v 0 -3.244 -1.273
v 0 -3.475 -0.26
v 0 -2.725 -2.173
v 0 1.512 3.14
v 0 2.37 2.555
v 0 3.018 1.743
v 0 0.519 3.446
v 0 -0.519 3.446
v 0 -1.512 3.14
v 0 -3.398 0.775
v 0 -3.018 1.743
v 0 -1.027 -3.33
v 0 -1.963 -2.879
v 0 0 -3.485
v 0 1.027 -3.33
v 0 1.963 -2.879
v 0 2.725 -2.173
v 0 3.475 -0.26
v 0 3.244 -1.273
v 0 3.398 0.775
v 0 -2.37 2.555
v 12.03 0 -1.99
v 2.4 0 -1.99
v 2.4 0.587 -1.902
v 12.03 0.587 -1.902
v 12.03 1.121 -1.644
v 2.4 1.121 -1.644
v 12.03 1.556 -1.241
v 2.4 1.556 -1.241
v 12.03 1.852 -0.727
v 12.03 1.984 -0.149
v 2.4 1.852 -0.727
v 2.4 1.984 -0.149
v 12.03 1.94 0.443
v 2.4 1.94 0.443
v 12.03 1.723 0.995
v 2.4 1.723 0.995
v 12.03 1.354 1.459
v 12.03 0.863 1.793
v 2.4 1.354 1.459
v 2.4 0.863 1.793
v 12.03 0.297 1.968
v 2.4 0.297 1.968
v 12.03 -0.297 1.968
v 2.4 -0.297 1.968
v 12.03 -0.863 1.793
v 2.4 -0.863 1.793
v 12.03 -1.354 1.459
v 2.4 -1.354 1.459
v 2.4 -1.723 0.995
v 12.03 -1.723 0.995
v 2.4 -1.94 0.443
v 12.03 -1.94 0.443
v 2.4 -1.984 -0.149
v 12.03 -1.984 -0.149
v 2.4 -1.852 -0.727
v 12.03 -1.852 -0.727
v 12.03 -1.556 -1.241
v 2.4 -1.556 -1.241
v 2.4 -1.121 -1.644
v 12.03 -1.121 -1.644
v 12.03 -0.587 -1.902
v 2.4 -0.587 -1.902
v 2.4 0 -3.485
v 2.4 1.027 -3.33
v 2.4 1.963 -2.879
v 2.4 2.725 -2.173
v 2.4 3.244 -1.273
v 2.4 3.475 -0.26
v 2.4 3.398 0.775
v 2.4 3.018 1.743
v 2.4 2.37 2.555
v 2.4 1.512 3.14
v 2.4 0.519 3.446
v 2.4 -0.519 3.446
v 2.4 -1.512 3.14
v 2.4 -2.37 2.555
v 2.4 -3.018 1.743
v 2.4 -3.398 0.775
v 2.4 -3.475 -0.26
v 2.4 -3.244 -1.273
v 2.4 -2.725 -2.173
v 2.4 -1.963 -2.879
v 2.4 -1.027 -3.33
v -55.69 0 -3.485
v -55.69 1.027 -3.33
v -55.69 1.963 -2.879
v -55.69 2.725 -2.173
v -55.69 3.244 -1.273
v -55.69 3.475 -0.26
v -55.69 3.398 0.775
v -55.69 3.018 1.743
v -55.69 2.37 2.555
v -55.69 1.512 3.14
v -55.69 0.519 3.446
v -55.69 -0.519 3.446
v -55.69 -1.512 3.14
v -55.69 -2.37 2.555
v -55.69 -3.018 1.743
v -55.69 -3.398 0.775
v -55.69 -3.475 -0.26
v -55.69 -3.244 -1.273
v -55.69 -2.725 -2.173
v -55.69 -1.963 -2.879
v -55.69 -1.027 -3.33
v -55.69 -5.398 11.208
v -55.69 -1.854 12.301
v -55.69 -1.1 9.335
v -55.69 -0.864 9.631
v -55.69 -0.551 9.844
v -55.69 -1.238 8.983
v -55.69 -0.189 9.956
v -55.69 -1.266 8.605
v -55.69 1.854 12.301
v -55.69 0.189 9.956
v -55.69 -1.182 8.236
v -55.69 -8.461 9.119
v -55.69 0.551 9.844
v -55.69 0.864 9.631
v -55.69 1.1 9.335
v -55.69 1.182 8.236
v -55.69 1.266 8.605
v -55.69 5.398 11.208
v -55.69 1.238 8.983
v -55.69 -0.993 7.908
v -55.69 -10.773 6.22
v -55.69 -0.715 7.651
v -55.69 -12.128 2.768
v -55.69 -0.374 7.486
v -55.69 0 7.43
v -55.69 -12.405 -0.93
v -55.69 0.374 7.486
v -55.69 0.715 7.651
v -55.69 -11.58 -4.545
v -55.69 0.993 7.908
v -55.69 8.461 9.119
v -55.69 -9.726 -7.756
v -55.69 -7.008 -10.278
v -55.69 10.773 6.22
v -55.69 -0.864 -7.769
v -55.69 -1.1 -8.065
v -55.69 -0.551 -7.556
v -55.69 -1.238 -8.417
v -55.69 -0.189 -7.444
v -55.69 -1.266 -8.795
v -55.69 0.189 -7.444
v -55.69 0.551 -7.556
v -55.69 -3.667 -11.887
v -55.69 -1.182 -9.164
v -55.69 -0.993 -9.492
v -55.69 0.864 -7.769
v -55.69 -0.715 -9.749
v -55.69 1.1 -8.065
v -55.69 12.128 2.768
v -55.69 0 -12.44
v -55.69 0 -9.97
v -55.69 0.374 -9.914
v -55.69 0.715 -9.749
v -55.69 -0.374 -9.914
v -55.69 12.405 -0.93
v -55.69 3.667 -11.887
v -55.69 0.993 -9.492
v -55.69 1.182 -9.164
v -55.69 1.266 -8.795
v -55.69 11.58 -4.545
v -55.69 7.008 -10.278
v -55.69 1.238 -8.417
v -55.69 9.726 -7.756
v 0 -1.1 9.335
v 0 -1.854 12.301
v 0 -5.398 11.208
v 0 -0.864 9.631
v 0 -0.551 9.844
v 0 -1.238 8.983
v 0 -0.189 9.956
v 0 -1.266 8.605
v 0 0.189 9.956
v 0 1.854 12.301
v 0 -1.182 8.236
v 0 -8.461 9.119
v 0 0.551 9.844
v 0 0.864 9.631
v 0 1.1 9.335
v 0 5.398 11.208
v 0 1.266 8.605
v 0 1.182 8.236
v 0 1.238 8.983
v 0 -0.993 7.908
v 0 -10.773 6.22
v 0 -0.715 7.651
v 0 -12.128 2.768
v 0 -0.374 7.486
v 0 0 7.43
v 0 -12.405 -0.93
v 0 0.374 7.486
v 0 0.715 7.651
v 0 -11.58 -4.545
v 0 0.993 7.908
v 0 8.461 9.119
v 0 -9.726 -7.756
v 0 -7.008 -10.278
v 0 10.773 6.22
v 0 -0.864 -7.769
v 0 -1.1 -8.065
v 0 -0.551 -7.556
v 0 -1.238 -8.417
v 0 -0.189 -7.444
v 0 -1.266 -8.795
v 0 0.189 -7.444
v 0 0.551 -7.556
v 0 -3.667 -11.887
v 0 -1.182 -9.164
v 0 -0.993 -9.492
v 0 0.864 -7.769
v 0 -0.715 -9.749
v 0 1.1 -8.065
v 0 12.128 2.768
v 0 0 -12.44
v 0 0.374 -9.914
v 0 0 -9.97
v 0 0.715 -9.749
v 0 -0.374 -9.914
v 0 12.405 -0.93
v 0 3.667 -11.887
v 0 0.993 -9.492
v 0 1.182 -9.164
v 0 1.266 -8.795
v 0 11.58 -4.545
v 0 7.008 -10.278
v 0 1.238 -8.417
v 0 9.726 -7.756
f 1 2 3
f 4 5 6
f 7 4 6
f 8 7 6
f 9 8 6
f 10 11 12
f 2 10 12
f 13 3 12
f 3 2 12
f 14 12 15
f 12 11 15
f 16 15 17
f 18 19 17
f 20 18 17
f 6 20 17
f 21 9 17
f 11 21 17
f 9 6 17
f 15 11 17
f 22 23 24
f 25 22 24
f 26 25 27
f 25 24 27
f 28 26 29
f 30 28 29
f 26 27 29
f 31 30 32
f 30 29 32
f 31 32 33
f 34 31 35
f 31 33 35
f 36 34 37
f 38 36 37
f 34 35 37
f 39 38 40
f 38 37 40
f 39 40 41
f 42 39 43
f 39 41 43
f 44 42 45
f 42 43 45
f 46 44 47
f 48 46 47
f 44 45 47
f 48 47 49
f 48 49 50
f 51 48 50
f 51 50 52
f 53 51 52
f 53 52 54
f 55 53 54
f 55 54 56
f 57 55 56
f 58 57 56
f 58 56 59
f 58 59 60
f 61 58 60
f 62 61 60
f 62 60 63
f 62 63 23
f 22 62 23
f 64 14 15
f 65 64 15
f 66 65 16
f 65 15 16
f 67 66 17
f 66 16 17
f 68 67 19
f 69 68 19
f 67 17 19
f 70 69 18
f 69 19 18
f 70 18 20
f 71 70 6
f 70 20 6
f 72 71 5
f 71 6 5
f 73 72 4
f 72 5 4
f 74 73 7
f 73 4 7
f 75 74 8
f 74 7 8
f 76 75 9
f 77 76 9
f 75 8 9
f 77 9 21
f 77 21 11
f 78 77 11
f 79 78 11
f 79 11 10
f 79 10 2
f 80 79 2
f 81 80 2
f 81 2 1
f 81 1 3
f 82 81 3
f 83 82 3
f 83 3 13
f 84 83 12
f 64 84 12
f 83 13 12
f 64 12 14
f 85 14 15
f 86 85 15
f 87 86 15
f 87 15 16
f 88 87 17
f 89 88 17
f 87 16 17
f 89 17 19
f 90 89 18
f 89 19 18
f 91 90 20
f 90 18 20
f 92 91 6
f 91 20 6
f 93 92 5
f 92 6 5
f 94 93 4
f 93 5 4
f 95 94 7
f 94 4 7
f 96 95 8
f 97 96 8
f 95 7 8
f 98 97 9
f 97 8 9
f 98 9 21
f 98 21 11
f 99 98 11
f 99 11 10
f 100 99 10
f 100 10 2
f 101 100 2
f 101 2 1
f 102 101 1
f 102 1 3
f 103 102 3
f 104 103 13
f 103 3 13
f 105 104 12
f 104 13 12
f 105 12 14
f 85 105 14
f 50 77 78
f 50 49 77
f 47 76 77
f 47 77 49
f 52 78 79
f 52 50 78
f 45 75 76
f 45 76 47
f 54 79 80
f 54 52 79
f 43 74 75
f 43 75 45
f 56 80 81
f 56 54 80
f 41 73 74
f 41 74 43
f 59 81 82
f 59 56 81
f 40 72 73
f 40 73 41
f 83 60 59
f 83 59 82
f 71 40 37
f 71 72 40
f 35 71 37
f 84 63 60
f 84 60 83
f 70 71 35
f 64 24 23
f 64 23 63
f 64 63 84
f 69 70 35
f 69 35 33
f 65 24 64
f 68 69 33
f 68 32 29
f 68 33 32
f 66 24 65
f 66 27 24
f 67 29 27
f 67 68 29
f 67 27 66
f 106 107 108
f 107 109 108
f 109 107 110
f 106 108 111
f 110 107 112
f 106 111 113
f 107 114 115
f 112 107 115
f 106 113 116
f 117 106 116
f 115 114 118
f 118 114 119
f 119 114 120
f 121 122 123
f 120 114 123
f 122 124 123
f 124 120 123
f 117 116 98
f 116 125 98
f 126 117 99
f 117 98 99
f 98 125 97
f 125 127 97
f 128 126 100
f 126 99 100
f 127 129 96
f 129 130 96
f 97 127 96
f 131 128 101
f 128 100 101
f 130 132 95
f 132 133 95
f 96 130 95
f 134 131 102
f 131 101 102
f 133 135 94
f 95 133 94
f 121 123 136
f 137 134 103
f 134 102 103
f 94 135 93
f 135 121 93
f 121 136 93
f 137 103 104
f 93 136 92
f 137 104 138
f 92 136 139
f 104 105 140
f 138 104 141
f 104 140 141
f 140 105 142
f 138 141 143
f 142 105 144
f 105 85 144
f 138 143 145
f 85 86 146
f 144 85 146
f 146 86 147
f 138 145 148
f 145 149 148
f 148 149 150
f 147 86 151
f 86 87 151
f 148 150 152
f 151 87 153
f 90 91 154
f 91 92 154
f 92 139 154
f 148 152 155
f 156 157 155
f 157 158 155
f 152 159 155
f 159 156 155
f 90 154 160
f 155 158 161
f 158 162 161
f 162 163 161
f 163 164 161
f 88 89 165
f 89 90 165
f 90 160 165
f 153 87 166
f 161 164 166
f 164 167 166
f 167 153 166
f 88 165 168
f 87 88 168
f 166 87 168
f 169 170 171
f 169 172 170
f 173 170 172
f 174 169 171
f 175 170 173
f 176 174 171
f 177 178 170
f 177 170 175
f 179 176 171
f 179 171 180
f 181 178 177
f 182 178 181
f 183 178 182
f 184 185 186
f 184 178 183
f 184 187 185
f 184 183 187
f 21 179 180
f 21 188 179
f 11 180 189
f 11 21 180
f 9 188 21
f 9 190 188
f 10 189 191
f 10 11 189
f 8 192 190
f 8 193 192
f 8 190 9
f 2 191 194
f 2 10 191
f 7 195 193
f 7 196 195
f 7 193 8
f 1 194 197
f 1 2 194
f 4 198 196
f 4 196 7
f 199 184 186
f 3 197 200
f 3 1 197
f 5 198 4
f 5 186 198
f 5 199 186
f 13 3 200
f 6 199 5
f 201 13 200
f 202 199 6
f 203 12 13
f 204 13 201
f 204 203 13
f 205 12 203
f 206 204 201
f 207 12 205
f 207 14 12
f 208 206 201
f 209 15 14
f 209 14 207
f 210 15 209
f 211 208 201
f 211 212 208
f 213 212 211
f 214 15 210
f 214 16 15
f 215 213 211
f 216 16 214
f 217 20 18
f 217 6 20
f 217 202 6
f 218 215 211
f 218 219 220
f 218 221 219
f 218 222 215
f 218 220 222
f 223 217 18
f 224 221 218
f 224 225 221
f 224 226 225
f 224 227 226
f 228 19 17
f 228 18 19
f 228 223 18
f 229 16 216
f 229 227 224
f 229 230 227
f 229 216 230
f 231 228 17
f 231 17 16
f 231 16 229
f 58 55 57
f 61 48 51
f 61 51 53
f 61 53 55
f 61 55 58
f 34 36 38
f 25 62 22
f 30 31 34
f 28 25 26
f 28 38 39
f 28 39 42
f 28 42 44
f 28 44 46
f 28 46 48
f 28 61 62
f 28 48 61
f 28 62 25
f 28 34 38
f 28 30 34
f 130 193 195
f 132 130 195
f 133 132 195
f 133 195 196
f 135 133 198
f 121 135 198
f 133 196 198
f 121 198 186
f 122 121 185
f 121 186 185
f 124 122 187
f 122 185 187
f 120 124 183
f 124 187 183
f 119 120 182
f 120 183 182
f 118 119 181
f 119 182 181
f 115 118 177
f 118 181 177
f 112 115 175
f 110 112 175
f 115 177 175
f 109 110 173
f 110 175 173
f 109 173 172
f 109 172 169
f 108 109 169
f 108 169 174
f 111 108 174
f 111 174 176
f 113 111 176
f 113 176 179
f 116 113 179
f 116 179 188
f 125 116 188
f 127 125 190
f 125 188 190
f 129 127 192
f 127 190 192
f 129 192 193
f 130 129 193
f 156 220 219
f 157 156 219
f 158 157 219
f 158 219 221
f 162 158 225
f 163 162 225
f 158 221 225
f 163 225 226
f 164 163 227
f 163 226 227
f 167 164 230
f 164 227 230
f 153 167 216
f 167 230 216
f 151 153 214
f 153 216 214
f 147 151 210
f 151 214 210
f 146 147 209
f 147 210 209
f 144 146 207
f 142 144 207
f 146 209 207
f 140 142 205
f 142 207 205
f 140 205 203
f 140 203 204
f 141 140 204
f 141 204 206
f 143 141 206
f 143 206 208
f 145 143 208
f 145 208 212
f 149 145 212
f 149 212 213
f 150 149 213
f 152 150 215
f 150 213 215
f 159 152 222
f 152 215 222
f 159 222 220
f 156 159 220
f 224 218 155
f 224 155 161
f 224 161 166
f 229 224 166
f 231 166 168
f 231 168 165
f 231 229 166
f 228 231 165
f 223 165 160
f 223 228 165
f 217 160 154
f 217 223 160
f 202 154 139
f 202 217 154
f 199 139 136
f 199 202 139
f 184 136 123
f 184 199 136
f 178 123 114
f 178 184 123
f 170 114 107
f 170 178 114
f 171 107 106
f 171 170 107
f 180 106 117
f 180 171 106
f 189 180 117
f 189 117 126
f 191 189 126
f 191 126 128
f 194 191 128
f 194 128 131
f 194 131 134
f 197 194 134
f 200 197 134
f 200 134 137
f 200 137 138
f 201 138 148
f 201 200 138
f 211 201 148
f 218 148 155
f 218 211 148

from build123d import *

# Parameters (mm, degrees)
SKETCH1_R           = 1.99
BOSS_EXTRUDE1_DEPTH = 12.03
SKETCH1_3_R         = 3.485
SKETCH1_3_R_2       = 1.99
BOSS_EXTRUDE2_DEPTH = 2.4
SKETCH1_4_R         = 12.44
SKETCH1_4_R_2       = 1.27
SKETCH1_4_R_3       = 3.485
BOSS_EXTRUDE3_DEPTH = 55.69


with BuildPart() as part:
    # Sketch1 → Boss-Extrude1 (new body)
    with BuildSketch(Plane(origin=(0, 0, 0), x_dir=(0, 0, -1), z_dir=(1, 0, 0))):
        Circle(SKETCH1_R)
    extrude(amount=BOSS_EXTRUDE1_DEPTH)

    # Sketch1<3> → Boss-Extrude2 (add)
    with BuildSketch(Plane(origin=(0, 0, 0), x_dir=(0, 0, -1), z_dir=(1, 0, 0))):
        Circle(SKETCH1_3_R)
        Circle(SKETCH1_3_R_2, mode=Mode.SUBTRACT)
    extrude(amount=BOSS_EXTRUDE2_DEPTH)


with BuildPart() as body_2:
    # Sketch1<4> → Boss-Extrude3 (new body)
    with BuildSketch(Plane(origin=(0, 0, 0), x_dir=(0, 0, -1), z_dir=(1, 0, 0))):
        Circle(SKETCH1_4_R)
        with Locations((-8.7, 0)):
            Circle(SKETCH1_4_R_2, mode=Mode.SUBTRACT)
        Circle(SKETCH1_4_R_3, mode=Mode.SUBTRACT)
        with Locations((8.7, 0)):
            Circle(SKETCH1_4_R_2, mode=Mode.SUBTRACT)
    extrude(amount=-BOSS_EXTRUDE3_DEPTH)


solid = Compound([part.part, body_2.part])
